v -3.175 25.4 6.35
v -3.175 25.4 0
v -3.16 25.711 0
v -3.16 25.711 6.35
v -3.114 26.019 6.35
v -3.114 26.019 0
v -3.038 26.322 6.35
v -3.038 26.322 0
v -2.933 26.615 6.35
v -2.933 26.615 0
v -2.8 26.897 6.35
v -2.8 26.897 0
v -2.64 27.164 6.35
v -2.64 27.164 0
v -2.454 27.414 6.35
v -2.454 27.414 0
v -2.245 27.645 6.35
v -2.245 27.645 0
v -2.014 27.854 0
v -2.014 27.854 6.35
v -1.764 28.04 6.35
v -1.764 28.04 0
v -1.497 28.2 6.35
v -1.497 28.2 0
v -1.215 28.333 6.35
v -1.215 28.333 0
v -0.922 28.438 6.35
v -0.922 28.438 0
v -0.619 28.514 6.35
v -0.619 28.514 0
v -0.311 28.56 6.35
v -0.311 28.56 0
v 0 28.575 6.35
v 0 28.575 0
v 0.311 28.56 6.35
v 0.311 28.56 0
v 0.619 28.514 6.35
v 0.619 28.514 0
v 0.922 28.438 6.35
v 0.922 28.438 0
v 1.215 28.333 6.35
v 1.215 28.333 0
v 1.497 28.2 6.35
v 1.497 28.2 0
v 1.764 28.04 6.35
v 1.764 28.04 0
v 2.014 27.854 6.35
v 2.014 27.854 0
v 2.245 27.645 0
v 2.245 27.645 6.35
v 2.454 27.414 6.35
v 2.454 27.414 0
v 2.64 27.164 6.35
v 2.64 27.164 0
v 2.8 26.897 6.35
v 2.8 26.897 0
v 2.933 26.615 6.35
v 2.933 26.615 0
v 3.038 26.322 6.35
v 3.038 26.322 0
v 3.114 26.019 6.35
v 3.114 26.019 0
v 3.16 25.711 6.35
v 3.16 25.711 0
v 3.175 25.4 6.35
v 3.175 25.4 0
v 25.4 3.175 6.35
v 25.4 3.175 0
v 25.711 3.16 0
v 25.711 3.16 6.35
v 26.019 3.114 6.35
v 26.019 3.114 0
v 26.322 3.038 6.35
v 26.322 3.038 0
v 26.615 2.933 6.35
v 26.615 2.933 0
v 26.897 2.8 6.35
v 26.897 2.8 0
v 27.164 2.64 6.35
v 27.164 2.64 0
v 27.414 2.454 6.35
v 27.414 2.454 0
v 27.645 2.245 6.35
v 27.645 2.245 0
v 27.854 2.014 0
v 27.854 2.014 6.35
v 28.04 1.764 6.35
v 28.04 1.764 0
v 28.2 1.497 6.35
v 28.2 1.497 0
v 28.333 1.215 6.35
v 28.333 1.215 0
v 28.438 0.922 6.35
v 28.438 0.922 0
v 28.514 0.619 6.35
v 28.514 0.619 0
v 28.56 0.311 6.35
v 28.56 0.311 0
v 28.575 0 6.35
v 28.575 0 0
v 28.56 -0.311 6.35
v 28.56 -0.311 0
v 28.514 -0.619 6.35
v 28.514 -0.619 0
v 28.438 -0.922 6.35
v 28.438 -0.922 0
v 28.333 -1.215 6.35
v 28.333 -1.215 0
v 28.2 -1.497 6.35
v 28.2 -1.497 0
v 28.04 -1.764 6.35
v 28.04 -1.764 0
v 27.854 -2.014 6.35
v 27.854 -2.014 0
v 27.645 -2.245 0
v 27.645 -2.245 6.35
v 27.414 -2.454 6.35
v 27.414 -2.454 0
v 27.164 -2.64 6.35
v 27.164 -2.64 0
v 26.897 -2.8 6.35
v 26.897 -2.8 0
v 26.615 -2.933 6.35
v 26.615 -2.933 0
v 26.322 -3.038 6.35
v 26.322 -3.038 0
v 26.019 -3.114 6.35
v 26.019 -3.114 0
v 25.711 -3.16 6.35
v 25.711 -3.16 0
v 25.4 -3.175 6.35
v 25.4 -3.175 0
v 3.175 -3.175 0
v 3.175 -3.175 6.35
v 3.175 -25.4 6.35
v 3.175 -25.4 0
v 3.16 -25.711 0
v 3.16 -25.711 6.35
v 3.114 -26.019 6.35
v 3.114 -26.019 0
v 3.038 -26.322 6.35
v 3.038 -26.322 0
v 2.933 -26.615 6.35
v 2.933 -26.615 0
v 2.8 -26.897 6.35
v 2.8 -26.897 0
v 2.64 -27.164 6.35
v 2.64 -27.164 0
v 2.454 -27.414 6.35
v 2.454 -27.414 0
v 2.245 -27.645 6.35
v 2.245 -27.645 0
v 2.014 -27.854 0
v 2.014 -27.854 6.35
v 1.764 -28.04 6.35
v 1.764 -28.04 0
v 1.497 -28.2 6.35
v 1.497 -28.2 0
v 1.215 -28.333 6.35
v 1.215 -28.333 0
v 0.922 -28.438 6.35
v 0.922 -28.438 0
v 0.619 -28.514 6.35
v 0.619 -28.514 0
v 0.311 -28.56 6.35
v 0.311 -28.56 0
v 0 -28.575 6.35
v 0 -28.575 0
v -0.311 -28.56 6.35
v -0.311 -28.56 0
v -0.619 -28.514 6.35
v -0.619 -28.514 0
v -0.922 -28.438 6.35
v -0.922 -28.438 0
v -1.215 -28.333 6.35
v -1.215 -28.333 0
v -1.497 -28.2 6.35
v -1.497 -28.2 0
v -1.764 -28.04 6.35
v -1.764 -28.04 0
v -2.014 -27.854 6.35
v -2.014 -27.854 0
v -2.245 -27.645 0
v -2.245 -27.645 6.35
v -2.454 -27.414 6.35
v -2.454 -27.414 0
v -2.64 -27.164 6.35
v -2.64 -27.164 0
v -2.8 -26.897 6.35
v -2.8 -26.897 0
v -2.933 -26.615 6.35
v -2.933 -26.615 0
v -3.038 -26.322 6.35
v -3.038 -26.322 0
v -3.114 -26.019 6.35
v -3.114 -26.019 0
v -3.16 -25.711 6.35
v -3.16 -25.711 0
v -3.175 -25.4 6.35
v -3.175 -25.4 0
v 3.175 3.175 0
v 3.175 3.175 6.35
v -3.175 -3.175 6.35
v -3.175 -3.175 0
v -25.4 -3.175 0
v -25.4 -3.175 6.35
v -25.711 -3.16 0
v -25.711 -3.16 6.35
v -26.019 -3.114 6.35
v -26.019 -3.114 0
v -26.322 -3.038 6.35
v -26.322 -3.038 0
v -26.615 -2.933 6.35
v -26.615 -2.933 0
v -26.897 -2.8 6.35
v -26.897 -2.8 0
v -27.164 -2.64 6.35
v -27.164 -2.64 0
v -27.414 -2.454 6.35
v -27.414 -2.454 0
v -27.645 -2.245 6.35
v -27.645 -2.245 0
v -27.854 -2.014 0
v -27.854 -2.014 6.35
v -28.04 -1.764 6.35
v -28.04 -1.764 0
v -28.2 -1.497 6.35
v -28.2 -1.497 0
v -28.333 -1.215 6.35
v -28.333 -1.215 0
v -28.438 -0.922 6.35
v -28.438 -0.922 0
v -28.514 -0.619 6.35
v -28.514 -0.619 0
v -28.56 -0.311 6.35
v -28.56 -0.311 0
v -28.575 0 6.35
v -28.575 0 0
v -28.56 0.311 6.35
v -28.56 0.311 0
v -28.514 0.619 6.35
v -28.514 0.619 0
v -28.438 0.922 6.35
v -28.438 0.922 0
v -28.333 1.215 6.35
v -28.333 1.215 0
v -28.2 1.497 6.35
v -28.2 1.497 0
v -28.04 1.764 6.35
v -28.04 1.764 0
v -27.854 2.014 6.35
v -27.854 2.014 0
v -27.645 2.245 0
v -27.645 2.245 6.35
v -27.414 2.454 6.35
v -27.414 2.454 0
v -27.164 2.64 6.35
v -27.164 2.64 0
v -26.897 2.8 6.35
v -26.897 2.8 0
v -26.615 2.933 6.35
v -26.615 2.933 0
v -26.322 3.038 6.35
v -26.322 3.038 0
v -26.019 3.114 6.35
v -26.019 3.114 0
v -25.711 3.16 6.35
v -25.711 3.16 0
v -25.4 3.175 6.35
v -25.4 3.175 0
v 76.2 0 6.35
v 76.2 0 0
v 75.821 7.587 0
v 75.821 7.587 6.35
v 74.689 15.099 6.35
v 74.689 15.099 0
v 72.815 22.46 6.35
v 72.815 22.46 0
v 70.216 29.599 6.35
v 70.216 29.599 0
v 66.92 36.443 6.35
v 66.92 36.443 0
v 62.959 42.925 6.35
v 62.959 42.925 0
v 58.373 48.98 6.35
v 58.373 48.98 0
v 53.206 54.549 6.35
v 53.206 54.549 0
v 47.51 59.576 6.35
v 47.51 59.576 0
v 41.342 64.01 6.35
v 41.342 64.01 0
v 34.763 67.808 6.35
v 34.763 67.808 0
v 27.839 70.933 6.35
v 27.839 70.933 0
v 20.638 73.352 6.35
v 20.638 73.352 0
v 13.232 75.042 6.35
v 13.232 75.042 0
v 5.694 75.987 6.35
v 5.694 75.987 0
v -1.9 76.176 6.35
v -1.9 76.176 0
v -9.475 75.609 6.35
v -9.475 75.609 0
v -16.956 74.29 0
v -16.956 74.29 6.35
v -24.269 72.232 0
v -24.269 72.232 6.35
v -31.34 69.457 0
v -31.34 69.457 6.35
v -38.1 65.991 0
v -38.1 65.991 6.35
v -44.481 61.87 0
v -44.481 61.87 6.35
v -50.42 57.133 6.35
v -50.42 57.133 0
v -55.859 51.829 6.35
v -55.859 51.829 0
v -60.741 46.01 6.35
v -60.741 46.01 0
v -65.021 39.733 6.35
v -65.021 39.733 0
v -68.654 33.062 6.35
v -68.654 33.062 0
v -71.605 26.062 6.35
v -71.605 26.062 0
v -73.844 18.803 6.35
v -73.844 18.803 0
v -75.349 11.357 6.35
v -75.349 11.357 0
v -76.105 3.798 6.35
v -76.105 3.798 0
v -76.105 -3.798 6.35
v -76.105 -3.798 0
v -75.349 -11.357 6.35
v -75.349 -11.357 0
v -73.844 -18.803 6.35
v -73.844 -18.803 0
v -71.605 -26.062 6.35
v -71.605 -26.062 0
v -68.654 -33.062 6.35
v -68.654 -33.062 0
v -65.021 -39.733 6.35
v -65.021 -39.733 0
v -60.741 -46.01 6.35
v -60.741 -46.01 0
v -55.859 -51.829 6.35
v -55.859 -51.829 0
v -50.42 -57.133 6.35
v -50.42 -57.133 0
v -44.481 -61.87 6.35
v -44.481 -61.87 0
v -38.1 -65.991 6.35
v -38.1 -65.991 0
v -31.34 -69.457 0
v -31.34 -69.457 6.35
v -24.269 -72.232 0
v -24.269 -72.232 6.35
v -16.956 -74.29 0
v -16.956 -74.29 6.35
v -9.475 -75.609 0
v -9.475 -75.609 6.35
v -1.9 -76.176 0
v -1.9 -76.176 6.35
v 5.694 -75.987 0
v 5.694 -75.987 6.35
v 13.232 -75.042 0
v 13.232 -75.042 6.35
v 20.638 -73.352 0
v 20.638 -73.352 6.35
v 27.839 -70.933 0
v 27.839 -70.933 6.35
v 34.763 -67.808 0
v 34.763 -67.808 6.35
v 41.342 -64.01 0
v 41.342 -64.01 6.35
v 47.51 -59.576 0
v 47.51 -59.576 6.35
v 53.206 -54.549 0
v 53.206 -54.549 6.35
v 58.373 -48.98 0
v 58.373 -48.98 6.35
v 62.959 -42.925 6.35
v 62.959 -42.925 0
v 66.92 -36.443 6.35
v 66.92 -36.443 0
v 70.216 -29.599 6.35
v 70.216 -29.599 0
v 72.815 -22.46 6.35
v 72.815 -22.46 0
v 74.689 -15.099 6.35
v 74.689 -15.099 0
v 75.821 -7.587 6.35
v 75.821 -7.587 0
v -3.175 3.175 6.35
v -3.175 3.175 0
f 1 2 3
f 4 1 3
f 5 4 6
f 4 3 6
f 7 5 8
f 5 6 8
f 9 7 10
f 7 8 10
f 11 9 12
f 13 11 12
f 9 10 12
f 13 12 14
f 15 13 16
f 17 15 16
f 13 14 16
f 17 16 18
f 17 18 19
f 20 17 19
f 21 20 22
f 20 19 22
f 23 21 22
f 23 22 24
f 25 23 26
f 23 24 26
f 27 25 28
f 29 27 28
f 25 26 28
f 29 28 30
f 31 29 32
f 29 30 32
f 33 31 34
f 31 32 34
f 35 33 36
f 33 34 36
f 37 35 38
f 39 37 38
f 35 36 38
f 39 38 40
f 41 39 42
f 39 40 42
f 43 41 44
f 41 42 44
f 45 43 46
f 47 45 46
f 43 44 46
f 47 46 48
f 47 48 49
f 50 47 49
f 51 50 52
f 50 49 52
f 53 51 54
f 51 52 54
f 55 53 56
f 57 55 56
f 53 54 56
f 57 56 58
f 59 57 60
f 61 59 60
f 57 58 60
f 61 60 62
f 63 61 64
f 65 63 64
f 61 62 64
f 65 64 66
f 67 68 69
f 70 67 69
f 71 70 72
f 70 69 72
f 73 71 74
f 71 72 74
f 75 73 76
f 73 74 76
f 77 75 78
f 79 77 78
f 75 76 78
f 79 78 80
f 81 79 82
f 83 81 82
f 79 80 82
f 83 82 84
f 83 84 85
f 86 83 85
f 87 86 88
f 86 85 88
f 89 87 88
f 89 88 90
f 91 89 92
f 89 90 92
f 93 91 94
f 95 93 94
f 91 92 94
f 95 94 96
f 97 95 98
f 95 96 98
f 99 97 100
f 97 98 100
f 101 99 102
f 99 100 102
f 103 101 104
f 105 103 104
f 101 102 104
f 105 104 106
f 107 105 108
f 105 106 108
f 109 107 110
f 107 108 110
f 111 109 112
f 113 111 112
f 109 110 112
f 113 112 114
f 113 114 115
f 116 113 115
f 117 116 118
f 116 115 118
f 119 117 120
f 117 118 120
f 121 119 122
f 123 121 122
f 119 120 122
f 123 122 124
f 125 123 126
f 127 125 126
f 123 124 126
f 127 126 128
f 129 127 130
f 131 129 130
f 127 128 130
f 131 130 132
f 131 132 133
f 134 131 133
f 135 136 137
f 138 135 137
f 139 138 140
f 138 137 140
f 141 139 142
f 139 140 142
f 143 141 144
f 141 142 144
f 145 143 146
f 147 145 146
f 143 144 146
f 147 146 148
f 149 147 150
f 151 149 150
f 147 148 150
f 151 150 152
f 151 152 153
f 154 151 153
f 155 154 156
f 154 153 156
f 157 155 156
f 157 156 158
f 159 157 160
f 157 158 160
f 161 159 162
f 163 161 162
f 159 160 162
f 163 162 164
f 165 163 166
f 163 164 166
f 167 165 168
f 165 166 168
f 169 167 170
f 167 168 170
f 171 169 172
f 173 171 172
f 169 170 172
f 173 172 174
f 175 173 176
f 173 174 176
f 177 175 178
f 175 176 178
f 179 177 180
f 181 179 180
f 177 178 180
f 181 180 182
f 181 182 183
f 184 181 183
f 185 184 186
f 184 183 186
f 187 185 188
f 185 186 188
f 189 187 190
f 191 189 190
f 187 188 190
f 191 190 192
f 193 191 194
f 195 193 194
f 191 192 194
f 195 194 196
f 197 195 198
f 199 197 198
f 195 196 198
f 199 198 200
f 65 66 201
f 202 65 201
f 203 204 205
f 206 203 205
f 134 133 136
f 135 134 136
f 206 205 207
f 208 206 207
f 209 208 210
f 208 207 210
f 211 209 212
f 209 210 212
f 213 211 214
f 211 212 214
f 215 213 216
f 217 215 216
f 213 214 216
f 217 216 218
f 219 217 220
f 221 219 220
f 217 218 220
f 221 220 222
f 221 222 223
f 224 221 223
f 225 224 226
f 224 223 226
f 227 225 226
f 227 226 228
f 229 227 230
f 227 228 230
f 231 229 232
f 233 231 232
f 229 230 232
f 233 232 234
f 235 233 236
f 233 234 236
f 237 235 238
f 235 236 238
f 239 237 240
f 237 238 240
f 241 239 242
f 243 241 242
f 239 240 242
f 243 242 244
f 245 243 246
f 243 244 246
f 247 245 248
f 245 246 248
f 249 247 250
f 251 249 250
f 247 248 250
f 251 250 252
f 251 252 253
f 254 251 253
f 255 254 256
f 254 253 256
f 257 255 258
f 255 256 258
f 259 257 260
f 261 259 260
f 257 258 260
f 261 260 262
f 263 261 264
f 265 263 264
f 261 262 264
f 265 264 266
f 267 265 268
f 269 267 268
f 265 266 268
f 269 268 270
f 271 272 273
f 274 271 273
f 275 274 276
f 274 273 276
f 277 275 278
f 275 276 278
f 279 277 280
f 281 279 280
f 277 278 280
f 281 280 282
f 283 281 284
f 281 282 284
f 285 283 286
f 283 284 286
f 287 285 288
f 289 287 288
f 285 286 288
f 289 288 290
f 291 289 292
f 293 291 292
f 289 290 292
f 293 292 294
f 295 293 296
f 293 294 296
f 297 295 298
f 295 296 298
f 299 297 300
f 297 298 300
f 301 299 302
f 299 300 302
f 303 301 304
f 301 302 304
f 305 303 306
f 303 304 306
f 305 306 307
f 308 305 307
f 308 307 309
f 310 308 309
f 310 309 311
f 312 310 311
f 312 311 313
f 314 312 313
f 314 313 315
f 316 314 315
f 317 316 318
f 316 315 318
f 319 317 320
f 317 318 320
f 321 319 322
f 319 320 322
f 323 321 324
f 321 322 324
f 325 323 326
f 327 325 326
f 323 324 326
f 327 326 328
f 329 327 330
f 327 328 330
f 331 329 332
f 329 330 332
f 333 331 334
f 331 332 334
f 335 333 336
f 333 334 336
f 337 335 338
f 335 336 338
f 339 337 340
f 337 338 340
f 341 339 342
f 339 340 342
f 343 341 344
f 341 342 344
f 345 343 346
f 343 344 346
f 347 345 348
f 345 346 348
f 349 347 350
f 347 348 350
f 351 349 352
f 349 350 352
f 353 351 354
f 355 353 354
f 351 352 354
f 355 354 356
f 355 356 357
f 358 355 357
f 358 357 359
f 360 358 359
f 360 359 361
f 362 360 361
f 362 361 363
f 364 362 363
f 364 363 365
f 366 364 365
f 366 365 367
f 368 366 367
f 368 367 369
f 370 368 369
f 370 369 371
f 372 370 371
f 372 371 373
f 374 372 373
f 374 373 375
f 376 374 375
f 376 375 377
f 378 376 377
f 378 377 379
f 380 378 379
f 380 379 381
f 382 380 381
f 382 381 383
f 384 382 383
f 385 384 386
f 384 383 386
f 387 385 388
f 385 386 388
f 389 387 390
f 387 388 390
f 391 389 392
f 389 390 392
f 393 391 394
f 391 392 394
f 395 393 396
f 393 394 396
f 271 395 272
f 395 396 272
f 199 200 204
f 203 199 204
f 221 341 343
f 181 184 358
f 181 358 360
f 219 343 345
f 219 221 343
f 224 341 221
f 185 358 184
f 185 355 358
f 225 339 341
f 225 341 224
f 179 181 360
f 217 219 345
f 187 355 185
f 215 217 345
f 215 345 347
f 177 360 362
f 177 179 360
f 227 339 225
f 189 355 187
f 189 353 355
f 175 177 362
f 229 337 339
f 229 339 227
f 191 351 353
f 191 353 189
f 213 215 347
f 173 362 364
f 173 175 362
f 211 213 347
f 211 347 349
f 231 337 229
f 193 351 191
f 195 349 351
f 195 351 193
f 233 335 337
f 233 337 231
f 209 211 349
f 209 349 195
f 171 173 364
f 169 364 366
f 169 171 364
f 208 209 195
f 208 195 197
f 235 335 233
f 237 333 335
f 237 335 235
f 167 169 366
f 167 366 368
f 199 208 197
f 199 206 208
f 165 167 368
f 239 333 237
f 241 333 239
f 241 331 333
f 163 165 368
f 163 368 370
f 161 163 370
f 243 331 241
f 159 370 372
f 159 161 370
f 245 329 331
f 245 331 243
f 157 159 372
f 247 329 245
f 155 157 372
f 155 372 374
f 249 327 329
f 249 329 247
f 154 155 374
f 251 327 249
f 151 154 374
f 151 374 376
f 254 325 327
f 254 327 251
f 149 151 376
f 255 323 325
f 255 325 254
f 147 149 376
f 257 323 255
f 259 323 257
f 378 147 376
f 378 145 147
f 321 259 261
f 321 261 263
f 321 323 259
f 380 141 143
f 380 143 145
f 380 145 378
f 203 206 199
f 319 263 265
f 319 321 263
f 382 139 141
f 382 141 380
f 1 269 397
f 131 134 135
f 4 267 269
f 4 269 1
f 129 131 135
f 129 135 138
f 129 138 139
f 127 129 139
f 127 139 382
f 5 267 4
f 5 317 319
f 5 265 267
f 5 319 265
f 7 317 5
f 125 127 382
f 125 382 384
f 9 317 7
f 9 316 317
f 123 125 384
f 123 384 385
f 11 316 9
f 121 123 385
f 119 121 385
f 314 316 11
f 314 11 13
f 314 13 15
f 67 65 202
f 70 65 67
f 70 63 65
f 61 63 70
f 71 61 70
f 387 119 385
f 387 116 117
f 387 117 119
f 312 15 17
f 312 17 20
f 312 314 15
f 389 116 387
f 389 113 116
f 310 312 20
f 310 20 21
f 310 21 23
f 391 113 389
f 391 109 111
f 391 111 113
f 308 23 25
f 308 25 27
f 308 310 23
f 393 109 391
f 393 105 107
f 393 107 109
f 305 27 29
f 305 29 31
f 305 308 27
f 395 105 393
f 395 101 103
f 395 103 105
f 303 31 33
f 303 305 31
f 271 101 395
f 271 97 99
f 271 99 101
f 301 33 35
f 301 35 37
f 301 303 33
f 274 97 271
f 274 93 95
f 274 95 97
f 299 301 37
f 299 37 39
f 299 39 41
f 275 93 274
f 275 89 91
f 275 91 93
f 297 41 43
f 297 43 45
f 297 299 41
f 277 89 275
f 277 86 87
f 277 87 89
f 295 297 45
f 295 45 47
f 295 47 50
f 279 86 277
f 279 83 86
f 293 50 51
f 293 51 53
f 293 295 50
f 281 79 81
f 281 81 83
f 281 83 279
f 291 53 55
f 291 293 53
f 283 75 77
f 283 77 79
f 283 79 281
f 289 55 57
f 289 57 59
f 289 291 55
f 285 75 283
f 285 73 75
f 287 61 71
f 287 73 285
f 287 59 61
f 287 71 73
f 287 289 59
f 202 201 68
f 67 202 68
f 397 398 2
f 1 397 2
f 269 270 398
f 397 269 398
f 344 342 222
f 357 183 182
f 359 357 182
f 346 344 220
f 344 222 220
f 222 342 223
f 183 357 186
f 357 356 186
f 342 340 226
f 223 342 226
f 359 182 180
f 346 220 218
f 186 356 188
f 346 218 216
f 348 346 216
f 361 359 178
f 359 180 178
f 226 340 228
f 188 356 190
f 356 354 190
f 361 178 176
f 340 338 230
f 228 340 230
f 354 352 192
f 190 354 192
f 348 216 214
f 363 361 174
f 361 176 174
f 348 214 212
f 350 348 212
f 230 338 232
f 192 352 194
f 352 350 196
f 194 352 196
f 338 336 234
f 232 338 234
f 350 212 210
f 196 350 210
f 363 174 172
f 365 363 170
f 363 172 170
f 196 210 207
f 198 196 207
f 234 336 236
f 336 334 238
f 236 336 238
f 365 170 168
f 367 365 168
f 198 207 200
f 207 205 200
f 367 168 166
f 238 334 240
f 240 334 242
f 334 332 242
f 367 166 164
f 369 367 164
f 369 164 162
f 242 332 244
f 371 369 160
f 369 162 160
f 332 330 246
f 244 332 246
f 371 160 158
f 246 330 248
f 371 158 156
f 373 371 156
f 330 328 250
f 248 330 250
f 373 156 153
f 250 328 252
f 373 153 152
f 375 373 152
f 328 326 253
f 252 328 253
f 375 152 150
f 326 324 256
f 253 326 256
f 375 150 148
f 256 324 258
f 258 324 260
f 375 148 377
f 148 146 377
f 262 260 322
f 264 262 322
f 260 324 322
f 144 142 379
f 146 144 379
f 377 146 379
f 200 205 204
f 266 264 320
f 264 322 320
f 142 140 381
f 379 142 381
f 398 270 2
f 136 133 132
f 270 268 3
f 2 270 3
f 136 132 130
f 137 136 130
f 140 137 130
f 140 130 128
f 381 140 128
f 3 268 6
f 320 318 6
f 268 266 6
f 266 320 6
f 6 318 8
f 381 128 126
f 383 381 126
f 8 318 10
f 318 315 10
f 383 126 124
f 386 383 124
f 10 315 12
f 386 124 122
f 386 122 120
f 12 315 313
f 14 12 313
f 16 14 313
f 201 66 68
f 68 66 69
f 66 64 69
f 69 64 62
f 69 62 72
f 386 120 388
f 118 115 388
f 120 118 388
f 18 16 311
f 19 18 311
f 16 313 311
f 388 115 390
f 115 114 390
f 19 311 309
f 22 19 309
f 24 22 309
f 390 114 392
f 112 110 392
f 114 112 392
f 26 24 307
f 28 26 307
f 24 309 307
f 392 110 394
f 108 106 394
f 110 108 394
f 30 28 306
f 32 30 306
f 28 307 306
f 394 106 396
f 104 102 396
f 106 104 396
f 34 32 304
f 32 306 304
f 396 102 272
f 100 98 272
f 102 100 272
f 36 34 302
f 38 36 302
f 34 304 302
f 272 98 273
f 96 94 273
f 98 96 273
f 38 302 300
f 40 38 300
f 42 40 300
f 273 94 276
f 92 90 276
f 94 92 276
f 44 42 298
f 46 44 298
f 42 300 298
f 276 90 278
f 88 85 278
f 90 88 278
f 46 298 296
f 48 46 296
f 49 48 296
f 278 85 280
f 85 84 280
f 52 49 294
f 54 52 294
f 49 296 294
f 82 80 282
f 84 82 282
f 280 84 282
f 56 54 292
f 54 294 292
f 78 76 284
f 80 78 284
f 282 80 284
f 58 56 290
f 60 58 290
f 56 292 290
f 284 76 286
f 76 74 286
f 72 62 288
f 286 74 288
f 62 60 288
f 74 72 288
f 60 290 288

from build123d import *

# Parameters (mm, degrees)
F0_R     = 76.2
F1_DEPTH = 6.35


with BuildPart() as f1:
    # F0 (on Top) → F1 (new body)
    with BuildSketch(Plane.XY):
        Circle(F0_R)
        with BuildLine():
            Line((-3.175, -25.4), (-3.175, -3.175))
            Line((-3.175, -3.175), (-25.4, -3.175))
            ThreePointArc((-25.4, -3.175), (-28.575, 0), (-25.4, 3.175))
            Line((-25.4, 3.175), (-3.175, 3.175))
            Line((-3.175, 3.175), (-3.175, 25.4))
            ThreePointArc((-3.175, 25.4), (0, 28.575), (3.175, 25.4))
            Line((3.175, 25.4), (3.175, 3.175))
            Line((3.175, 3.175), (25.4, 3.175))
            ThreePointArc((25.4, 3.175), (28.575, 0), (25.4, -3.175))
            Line((25.4, -3.175), (3.175, -3.175))
            Line((3.175, -3.175), (3.175, -25.4))
            ThreePointArc((3.175, -25.4), (0, -28.575), (-3.175, -25.4))
        make_face(mode=Mode.SUBTRACT)
    extrude(amount=F1_DEPTH)


solid = f1.part
